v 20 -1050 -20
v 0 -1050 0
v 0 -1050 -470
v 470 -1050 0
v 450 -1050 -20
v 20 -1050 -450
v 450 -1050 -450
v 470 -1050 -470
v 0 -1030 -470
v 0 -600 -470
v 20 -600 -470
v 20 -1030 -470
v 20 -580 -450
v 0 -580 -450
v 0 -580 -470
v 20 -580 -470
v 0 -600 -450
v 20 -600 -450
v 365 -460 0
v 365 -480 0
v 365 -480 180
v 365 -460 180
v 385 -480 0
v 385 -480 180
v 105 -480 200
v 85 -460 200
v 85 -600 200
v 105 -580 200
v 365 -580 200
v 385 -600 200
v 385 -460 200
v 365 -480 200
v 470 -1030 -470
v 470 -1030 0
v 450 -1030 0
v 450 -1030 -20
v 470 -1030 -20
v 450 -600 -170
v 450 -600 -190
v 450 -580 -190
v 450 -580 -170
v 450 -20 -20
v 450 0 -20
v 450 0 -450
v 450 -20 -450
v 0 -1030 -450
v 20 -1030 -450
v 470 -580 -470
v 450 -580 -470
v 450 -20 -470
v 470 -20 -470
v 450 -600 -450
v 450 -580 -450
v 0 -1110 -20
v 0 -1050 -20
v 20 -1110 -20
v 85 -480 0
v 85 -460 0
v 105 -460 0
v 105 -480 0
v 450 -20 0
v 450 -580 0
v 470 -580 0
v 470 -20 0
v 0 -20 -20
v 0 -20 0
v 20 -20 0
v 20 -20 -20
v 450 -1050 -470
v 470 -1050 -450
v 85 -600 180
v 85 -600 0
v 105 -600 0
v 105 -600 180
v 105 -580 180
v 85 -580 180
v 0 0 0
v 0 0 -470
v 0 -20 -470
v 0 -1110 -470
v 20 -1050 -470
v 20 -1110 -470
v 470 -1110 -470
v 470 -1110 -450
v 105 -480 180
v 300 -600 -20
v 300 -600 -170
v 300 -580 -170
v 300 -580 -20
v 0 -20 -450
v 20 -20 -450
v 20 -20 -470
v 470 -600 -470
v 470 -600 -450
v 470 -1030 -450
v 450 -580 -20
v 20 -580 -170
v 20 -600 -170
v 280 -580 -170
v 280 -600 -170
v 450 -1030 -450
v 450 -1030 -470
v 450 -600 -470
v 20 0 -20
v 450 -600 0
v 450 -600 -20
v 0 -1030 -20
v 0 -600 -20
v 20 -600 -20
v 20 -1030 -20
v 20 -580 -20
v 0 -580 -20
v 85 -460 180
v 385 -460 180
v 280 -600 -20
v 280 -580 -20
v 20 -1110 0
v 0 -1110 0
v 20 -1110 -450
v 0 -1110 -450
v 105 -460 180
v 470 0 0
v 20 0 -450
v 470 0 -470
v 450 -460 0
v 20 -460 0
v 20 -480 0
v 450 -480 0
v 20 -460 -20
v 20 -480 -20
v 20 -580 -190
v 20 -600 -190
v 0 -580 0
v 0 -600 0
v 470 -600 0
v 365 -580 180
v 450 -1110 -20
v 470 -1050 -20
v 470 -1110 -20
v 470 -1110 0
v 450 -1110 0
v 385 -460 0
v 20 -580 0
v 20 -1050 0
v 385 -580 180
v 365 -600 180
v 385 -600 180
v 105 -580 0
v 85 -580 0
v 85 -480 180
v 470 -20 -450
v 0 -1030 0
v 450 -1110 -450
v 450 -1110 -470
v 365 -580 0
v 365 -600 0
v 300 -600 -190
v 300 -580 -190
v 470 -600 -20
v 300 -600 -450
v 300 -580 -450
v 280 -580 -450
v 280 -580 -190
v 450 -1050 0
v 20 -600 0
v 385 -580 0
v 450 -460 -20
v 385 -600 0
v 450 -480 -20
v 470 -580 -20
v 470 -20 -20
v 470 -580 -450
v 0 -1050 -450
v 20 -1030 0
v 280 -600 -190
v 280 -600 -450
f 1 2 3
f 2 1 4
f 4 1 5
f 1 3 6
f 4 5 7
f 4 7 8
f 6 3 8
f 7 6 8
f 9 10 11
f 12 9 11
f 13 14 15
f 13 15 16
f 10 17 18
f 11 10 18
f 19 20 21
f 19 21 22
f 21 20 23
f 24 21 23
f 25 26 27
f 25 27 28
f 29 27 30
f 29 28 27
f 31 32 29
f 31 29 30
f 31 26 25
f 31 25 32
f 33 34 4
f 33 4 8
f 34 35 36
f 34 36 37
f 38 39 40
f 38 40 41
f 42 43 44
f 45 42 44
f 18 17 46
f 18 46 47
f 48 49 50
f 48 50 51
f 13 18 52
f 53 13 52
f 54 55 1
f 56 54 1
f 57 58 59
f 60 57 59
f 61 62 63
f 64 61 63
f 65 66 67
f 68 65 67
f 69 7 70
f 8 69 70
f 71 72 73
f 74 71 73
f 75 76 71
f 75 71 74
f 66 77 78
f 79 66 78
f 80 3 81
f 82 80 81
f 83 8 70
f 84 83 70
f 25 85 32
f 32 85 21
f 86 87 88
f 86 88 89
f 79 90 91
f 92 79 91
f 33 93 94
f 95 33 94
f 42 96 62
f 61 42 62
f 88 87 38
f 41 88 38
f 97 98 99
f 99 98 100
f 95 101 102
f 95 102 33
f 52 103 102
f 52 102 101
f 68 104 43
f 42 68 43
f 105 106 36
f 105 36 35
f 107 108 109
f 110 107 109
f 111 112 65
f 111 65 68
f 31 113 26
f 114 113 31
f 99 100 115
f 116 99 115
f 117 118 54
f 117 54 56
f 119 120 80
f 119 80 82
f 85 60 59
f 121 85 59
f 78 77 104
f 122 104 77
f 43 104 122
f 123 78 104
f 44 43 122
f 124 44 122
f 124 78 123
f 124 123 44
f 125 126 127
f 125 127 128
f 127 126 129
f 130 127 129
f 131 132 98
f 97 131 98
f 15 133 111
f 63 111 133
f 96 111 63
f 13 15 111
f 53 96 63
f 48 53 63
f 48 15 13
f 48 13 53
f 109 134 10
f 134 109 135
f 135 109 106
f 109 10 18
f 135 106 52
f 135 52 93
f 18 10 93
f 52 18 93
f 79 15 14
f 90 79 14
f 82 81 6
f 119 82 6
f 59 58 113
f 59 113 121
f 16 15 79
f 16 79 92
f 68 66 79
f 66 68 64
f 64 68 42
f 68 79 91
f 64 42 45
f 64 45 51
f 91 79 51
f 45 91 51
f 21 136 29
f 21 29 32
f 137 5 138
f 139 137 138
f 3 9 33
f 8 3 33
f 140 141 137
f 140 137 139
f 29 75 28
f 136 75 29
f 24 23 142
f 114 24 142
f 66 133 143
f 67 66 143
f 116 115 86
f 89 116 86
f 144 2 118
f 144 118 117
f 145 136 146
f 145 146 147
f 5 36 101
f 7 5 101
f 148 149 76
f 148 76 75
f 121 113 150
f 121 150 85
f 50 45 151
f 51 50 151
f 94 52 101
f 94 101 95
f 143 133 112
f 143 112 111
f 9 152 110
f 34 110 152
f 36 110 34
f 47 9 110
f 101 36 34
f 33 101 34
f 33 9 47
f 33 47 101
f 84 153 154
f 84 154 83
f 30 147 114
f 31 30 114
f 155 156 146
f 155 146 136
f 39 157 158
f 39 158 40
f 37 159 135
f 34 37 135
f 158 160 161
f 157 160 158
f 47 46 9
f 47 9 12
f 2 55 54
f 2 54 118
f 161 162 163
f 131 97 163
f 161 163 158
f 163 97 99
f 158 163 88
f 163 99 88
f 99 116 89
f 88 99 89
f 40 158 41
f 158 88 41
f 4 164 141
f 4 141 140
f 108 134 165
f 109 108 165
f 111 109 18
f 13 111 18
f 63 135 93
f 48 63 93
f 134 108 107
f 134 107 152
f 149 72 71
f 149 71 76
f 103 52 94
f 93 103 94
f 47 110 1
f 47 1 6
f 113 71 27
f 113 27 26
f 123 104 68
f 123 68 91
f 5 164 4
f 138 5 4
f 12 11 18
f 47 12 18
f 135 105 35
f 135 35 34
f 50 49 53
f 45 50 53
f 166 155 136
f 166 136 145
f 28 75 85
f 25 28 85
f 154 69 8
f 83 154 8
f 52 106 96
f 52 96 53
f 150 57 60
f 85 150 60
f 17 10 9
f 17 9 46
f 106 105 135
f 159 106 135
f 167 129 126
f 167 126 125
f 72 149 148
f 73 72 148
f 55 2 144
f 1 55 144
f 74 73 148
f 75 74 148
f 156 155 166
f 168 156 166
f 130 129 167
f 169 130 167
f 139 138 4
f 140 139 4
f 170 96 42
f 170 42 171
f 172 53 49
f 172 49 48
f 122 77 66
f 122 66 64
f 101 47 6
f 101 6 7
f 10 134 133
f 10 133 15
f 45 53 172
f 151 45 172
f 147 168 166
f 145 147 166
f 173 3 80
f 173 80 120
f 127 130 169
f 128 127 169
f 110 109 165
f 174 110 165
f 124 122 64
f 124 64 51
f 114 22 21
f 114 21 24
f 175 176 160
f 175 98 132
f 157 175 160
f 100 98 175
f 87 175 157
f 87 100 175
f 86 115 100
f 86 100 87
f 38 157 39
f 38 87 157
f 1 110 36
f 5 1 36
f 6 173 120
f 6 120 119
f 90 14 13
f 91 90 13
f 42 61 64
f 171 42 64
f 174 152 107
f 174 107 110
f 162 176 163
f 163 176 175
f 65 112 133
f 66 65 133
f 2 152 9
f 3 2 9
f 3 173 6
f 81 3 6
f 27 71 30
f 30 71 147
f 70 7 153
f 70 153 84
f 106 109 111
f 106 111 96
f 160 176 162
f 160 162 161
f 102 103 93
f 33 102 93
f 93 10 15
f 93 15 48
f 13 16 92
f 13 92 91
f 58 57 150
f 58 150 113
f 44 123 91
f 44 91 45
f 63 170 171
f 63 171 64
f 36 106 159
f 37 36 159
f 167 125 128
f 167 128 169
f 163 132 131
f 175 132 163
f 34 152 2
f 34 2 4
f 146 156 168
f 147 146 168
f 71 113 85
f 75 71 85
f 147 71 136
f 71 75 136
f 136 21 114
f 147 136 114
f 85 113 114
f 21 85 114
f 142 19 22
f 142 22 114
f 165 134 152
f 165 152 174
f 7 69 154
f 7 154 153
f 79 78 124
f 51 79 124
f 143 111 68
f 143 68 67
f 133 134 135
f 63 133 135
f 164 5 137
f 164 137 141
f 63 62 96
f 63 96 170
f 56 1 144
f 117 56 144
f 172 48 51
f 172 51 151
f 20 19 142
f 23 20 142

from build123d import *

# Parameters (mm, degrees)
SKETCH_1_W        = 470
SKETCH_1_H        = 470
SKETCH_1_W_2      = 430
SKETCH_1_H_2      = 430
EXTRUDE_1_DEPTH   = 20
SKETCH_2_W        = 20
SKETCH_2_H        = 20
EXTRUDE_2_DEPTH   = 560
EXTRUDE_2_2_DEPTH = 560
EXTRUDE_2_3_DEPTH = 560
EXTRUDE_2_4_DEPTH = 560
SKETCH_3_W        = 470
SKETCH_3_H        = 470
SKETCH_3_W_2      = 430
SKETCH_3_H_2      = 430
EXTRUDE_3_DEPTH   = 20
SKETCH_4_W        = 470
SKETCH_4_H        = 470
SKETCH_4_W_2      = 430
SKETCH_4_H_2      = 430
EXTRUDE_4_DEPTH   = 20
SKETCH_5_W        = 20
SKETCH_5_H        = 20
EXTRUDE_5_DEPTH   = 430
EXTRUDE_5_2_DEPTH = 430
EXTRUDE_5_3_DEPTH = 430
EXTRUDE_5_4_DEPTH = 430
SKETCH_6_W        = 20
SKETCH_6_H        = 20
EXTRUDE_6_DEPTH   = 60
EXTRUDE_6_2_DEPTH = 60
EXTRUDE_6_3_DEPTH = 60
EXTRUDE_6_4_DEPTH = 60
SKETCH_8_W        = 430
SKETCH_8_H        = 20
EXTRUDE_7_DEPTH   = 20
EXTRUDE_START     = 180
SKETCH_9_W        = 300
SKETCH_9_H        = 140
SKETCH_9_W_2      = 260
SKETCH_9_H_2      = 100
EXTRUDE_8_DEPTH   = 20
SKETCH_10_W       = 20
SKETCH_10_H       = 20
EXTRUDE_9_DEPTH   = 180
EXTRUDE_9_2_DEPTH = 180
EXTRUDE_9_3_DEPTH = 180
EXTRUDE_9_4_DEPTH = 180
SKETCH_11_W       = 20
SKETCH_11_H       = 430
SKETCH_11_W_2     = 430
SKETCH_11_H_2     = 20
EXTRUDE_10_DEPTH  = 20


with BuildPart() as part:
    # 스케치1 → 보스-돌출1 (new body)
    with BuildSketch(Plane(origin=(0, 0, 0), x_dir=(1, 0, 0), z_dir=(0, 1, 0))):
        with Locations((235, 235)):
            Rectangle(SKETCH_1_W, SKETCH_1_H)
        with Locations((235, 235)):
            Rectangle(SKETCH_1_W_2, SKETCH_1_H_2, mode=Mode.SUBTRACT)
    extrude(amount=-EXTRUDE_1_DEPTH)


with BuildPart() as body_2:
    # 스케치2 → 보스-돌출2 (new body)
    with BuildSketch(Plane.XZ.offset(20)):
        with Locations((10, -10)):
            Rectangle(SKETCH_2_W, SKETCH_2_H)
    extrude(amount=EXTRUDE_2_DEPTH)


with BuildPart() as body_3:
    # 스케치2 → Extrude 2 2 (new body)
    with BuildSketch(Plane.XZ.offset(20)):
        with Locations((460, -10)):
            Rectangle(SKETCH_2_W, SKETCH_2_H)
    extrude(amount=EXTRUDE_2_2_DEPTH)


with BuildPart() as body_4:
    # 스케치2 → Extrude 2 3 (new body)
    with BuildSketch(Plane.XZ.offset(20)):
        with Locations((460, -460)):
            Rectangle(SKETCH_2_W, SKETCH_2_H)
    extrude(amount=EXTRUDE_2_3_DEPTH)


with BuildPart() as body_5:
    # 스케치2 → Extrude 2 4 (new body)
    with BuildSketch(Plane.XZ.offset(20)):
        with Locations((10, -460)):
            Rectangle(SKETCH_2_W, SKETCH_2_H)
    extrude(amount=EXTRUDE_2_4_DEPTH)


with BuildPart() as body_6:
    # 스케치3 → 보스-돌출3 (new body)
    with BuildSketch(Plane(origin=(0, -1030, 0), x_dir=(1, 0, 0), z_dir=(0, 1, 0))):
        with Locations((235, 235)):
            Rectangle(SKETCH_3_W, SKETCH_3_H)
        with Locations((235, 235)):
            Rectangle(SKETCH_3_W_2, SKETCH_3_H_2, mode=Mode.SUBTRACT)
    extrude(amount=-EXTRUDE_3_DEPTH)


with BuildPart() as body_7:
    # 스케치4 → 보스-돌출4 (new body)
    with BuildSketch(Plane(origin=(0, -600, 0), x_dir=(1, 0, 0), z_dir=(0, 1, 0))):
        with Locations((235, 235)):
            Rectangle(SKETCH_4_W, SKETCH_4_H)
        with Locations((235, 235)):
            Rectangle(SKETCH_4_W_2, SKETCH_4_H_2, mode=Mode.SUBTRACT)
    extrude(amount=EXTRUDE_4_DEPTH)


with BuildPart() as body_8:
    # 스케치5 → 보스-돌출5 (new body)
    with BuildSketch(Plane.XZ.offset(600)):
        with Locations((10, -10)):
            Rectangle(SKETCH_5_W, SKETCH_5_H)
    extrude(amount=EXTRUDE_5_DEPTH)


with BuildPart() as body_9:
    # 스케치5 → Extrude 5 2 (new body)
    with BuildSketch(Plane.XZ.offset(600)):
        with Locations((460, -10)):
            Rectangle(SKETCH_5_W, SKETCH_5_H)
    extrude(amount=EXTRUDE_5_2_DEPTH)


with BuildPart() as body_10:
    # 스케치5 → Extrude 5 3 (new body)
    with BuildSketch(Plane.XZ.offset(600)):
        with Locations((460, -460)):
            Rectangle(SKETCH_5_W, SKETCH_5_H)
    extrude(amount=EXTRUDE_5_3_DEPTH)


with BuildPart() as body_11:
    # 스케치5 → Extrude 5 4 (new body)
    with BuildSketch(Plane.XZ.offset(600)):
        with Locations((10, -460)):
            Rectangle(SKETCH_5_W, SKETCH_5_H)
    extrude(amount=EXTRUDE_5_4_DEPTH)


with BuildPart() as body_12:
    # 스케치6 → 보스-돌출6 (new body)
    with BuildSketch(Plane.XZ.offset(1050)):
        with Locations((10, -10)):
            Rectangle(SKETCH_6_W, SKETCH_6_H)
    extrude(amount=EXTRUDE_6_DEPTH)


with BuildPart() as body_13:
    # 스케치6 → Extrude 6 2 (new body)
    with BuildSketch(Plane.XZ.offset(1050)):
        with Locations((460, -10)):
            Rectangle(SKETCH_6_W, SKETCH_6_H)
    extrude(amount=EXTRUDE_6_2_DEPTH)


with BuildPart() as body_14:
    # 스케치6 → Extrude 6 3 (new body)
    with BuildSketch(Plane.XZ.offset(1050)):
        with Locations((460, -460)):
            Rectangle(SKETCH_6_W, SKETCH_6_H)
    extrude(amount=EXTRUDE_6_3_DEPTH)


with BuildPart() as body_15:
    # 스케치6 → Extrude 6 4 (new body)
    with BuildSketch(Plane.XZ.offset(1050)):
        with Locations((10, -460)):
            Rectangle(SKETCH_6_W, SKETCH_6_H)
    extrude(amount=EXTRUDE_6_4_DEPTH)


with BuildPart() as body_16:
    # 스케치8 → 보스-돌출7 (new body)
    with BuildSketch(Plane(origin=(0, -460, 0), x_dir=(1, 0, 0), z_dir=(0, 1, 0))):
        with Locations((235, 10)):
            Rectangle(SKETCH_8_W, SKETCH_8_H)
    extrude(amount=-EXTRUDE_7_DEPTH)


with BuildPart() as body_17:
    # 스케치9 → 보스-돌출8 (new body)
    with BuildSketch(Plane.XY.offset(EXTRUDE_START)):
        with Locations((235, -530)):
            Rectangle(SKETCH_9_W, SKETCH_9_H)
        with Locations((235, -530)):
            Rectangle(SKETCH_9_W_2, SKETCH_9_H_2, mode=Mode.SUBTRACT)
    extrude(amount=EXTRUDE_8_DEPTH)


with BuildPart() as body_18:
    # 스케치10 → 보스-돌출9 (new body)
    with BuildSketch(Plane.XY):
        with Locations((95, -470)):
            Rectangle(SKETCH_10_W, SKETCH_10_H)
    extrude(amount=EXTRUDE_9_DEPTH)


with BuildPart() as body_19:
    # 스케치10 → Extrude 9 2 (new body)
    with BuildSketch(Plane.XY):
        with Locations((375, -470)):
            Rectangle(SKETCH_10_W, SKETCH_10_H)
    extrude(amount=EXTRUDE_9_2_DEPTH)


with BuildPart() as body_20:
    # 스케치10 → Extrude 9 3 (new body)
    with BuildSketch(Plane.XY):
        with Locations((375, -590)):
            Rectangle(SKETCH_10_W, SKETCH_10_H)
    extrude(amount=EXTRUDE_9_3_DEPTH)


with BuildPart() as body_21:
    # 스케치10 → Extrude 9 4 (new body)
    with BuildSketch(Plane.XY):
        with Locations((95, -590)):
            Rectangle(SKETCH_10_W, SKETCH_10_H)
    extrude(amount=EXTRUDE_9_4_DEPTH)


with BuildPart() as body_22:
    # 스케치11 → 보스-돌출10 (new body)
    with BuildSketch(Plane.XZ.offset(600)):
        with Locations((290, -235)):
            Rectangle(SKETCH_11_W, SKETCH_11_H)
        with Locations((235, -180)):
            Rectangle(SKETCH_11_W_2, SKETCH_11_H_2)
    extrude(amount=-EXTRUDE_10_DEPTH)


solid = Compound([part.part, body_2.part, body_3.part, body_4.part, body_5.part, body_6.part, body_7.part, body_8.part, body_9.part, body_10.part, body_11.part, body_12.part, body_13.part, body_14.part, body_15.part, body_16.part, body_17.part, body_18.part, body_19.part, body_20.part, body_21.part, body_22.part])
